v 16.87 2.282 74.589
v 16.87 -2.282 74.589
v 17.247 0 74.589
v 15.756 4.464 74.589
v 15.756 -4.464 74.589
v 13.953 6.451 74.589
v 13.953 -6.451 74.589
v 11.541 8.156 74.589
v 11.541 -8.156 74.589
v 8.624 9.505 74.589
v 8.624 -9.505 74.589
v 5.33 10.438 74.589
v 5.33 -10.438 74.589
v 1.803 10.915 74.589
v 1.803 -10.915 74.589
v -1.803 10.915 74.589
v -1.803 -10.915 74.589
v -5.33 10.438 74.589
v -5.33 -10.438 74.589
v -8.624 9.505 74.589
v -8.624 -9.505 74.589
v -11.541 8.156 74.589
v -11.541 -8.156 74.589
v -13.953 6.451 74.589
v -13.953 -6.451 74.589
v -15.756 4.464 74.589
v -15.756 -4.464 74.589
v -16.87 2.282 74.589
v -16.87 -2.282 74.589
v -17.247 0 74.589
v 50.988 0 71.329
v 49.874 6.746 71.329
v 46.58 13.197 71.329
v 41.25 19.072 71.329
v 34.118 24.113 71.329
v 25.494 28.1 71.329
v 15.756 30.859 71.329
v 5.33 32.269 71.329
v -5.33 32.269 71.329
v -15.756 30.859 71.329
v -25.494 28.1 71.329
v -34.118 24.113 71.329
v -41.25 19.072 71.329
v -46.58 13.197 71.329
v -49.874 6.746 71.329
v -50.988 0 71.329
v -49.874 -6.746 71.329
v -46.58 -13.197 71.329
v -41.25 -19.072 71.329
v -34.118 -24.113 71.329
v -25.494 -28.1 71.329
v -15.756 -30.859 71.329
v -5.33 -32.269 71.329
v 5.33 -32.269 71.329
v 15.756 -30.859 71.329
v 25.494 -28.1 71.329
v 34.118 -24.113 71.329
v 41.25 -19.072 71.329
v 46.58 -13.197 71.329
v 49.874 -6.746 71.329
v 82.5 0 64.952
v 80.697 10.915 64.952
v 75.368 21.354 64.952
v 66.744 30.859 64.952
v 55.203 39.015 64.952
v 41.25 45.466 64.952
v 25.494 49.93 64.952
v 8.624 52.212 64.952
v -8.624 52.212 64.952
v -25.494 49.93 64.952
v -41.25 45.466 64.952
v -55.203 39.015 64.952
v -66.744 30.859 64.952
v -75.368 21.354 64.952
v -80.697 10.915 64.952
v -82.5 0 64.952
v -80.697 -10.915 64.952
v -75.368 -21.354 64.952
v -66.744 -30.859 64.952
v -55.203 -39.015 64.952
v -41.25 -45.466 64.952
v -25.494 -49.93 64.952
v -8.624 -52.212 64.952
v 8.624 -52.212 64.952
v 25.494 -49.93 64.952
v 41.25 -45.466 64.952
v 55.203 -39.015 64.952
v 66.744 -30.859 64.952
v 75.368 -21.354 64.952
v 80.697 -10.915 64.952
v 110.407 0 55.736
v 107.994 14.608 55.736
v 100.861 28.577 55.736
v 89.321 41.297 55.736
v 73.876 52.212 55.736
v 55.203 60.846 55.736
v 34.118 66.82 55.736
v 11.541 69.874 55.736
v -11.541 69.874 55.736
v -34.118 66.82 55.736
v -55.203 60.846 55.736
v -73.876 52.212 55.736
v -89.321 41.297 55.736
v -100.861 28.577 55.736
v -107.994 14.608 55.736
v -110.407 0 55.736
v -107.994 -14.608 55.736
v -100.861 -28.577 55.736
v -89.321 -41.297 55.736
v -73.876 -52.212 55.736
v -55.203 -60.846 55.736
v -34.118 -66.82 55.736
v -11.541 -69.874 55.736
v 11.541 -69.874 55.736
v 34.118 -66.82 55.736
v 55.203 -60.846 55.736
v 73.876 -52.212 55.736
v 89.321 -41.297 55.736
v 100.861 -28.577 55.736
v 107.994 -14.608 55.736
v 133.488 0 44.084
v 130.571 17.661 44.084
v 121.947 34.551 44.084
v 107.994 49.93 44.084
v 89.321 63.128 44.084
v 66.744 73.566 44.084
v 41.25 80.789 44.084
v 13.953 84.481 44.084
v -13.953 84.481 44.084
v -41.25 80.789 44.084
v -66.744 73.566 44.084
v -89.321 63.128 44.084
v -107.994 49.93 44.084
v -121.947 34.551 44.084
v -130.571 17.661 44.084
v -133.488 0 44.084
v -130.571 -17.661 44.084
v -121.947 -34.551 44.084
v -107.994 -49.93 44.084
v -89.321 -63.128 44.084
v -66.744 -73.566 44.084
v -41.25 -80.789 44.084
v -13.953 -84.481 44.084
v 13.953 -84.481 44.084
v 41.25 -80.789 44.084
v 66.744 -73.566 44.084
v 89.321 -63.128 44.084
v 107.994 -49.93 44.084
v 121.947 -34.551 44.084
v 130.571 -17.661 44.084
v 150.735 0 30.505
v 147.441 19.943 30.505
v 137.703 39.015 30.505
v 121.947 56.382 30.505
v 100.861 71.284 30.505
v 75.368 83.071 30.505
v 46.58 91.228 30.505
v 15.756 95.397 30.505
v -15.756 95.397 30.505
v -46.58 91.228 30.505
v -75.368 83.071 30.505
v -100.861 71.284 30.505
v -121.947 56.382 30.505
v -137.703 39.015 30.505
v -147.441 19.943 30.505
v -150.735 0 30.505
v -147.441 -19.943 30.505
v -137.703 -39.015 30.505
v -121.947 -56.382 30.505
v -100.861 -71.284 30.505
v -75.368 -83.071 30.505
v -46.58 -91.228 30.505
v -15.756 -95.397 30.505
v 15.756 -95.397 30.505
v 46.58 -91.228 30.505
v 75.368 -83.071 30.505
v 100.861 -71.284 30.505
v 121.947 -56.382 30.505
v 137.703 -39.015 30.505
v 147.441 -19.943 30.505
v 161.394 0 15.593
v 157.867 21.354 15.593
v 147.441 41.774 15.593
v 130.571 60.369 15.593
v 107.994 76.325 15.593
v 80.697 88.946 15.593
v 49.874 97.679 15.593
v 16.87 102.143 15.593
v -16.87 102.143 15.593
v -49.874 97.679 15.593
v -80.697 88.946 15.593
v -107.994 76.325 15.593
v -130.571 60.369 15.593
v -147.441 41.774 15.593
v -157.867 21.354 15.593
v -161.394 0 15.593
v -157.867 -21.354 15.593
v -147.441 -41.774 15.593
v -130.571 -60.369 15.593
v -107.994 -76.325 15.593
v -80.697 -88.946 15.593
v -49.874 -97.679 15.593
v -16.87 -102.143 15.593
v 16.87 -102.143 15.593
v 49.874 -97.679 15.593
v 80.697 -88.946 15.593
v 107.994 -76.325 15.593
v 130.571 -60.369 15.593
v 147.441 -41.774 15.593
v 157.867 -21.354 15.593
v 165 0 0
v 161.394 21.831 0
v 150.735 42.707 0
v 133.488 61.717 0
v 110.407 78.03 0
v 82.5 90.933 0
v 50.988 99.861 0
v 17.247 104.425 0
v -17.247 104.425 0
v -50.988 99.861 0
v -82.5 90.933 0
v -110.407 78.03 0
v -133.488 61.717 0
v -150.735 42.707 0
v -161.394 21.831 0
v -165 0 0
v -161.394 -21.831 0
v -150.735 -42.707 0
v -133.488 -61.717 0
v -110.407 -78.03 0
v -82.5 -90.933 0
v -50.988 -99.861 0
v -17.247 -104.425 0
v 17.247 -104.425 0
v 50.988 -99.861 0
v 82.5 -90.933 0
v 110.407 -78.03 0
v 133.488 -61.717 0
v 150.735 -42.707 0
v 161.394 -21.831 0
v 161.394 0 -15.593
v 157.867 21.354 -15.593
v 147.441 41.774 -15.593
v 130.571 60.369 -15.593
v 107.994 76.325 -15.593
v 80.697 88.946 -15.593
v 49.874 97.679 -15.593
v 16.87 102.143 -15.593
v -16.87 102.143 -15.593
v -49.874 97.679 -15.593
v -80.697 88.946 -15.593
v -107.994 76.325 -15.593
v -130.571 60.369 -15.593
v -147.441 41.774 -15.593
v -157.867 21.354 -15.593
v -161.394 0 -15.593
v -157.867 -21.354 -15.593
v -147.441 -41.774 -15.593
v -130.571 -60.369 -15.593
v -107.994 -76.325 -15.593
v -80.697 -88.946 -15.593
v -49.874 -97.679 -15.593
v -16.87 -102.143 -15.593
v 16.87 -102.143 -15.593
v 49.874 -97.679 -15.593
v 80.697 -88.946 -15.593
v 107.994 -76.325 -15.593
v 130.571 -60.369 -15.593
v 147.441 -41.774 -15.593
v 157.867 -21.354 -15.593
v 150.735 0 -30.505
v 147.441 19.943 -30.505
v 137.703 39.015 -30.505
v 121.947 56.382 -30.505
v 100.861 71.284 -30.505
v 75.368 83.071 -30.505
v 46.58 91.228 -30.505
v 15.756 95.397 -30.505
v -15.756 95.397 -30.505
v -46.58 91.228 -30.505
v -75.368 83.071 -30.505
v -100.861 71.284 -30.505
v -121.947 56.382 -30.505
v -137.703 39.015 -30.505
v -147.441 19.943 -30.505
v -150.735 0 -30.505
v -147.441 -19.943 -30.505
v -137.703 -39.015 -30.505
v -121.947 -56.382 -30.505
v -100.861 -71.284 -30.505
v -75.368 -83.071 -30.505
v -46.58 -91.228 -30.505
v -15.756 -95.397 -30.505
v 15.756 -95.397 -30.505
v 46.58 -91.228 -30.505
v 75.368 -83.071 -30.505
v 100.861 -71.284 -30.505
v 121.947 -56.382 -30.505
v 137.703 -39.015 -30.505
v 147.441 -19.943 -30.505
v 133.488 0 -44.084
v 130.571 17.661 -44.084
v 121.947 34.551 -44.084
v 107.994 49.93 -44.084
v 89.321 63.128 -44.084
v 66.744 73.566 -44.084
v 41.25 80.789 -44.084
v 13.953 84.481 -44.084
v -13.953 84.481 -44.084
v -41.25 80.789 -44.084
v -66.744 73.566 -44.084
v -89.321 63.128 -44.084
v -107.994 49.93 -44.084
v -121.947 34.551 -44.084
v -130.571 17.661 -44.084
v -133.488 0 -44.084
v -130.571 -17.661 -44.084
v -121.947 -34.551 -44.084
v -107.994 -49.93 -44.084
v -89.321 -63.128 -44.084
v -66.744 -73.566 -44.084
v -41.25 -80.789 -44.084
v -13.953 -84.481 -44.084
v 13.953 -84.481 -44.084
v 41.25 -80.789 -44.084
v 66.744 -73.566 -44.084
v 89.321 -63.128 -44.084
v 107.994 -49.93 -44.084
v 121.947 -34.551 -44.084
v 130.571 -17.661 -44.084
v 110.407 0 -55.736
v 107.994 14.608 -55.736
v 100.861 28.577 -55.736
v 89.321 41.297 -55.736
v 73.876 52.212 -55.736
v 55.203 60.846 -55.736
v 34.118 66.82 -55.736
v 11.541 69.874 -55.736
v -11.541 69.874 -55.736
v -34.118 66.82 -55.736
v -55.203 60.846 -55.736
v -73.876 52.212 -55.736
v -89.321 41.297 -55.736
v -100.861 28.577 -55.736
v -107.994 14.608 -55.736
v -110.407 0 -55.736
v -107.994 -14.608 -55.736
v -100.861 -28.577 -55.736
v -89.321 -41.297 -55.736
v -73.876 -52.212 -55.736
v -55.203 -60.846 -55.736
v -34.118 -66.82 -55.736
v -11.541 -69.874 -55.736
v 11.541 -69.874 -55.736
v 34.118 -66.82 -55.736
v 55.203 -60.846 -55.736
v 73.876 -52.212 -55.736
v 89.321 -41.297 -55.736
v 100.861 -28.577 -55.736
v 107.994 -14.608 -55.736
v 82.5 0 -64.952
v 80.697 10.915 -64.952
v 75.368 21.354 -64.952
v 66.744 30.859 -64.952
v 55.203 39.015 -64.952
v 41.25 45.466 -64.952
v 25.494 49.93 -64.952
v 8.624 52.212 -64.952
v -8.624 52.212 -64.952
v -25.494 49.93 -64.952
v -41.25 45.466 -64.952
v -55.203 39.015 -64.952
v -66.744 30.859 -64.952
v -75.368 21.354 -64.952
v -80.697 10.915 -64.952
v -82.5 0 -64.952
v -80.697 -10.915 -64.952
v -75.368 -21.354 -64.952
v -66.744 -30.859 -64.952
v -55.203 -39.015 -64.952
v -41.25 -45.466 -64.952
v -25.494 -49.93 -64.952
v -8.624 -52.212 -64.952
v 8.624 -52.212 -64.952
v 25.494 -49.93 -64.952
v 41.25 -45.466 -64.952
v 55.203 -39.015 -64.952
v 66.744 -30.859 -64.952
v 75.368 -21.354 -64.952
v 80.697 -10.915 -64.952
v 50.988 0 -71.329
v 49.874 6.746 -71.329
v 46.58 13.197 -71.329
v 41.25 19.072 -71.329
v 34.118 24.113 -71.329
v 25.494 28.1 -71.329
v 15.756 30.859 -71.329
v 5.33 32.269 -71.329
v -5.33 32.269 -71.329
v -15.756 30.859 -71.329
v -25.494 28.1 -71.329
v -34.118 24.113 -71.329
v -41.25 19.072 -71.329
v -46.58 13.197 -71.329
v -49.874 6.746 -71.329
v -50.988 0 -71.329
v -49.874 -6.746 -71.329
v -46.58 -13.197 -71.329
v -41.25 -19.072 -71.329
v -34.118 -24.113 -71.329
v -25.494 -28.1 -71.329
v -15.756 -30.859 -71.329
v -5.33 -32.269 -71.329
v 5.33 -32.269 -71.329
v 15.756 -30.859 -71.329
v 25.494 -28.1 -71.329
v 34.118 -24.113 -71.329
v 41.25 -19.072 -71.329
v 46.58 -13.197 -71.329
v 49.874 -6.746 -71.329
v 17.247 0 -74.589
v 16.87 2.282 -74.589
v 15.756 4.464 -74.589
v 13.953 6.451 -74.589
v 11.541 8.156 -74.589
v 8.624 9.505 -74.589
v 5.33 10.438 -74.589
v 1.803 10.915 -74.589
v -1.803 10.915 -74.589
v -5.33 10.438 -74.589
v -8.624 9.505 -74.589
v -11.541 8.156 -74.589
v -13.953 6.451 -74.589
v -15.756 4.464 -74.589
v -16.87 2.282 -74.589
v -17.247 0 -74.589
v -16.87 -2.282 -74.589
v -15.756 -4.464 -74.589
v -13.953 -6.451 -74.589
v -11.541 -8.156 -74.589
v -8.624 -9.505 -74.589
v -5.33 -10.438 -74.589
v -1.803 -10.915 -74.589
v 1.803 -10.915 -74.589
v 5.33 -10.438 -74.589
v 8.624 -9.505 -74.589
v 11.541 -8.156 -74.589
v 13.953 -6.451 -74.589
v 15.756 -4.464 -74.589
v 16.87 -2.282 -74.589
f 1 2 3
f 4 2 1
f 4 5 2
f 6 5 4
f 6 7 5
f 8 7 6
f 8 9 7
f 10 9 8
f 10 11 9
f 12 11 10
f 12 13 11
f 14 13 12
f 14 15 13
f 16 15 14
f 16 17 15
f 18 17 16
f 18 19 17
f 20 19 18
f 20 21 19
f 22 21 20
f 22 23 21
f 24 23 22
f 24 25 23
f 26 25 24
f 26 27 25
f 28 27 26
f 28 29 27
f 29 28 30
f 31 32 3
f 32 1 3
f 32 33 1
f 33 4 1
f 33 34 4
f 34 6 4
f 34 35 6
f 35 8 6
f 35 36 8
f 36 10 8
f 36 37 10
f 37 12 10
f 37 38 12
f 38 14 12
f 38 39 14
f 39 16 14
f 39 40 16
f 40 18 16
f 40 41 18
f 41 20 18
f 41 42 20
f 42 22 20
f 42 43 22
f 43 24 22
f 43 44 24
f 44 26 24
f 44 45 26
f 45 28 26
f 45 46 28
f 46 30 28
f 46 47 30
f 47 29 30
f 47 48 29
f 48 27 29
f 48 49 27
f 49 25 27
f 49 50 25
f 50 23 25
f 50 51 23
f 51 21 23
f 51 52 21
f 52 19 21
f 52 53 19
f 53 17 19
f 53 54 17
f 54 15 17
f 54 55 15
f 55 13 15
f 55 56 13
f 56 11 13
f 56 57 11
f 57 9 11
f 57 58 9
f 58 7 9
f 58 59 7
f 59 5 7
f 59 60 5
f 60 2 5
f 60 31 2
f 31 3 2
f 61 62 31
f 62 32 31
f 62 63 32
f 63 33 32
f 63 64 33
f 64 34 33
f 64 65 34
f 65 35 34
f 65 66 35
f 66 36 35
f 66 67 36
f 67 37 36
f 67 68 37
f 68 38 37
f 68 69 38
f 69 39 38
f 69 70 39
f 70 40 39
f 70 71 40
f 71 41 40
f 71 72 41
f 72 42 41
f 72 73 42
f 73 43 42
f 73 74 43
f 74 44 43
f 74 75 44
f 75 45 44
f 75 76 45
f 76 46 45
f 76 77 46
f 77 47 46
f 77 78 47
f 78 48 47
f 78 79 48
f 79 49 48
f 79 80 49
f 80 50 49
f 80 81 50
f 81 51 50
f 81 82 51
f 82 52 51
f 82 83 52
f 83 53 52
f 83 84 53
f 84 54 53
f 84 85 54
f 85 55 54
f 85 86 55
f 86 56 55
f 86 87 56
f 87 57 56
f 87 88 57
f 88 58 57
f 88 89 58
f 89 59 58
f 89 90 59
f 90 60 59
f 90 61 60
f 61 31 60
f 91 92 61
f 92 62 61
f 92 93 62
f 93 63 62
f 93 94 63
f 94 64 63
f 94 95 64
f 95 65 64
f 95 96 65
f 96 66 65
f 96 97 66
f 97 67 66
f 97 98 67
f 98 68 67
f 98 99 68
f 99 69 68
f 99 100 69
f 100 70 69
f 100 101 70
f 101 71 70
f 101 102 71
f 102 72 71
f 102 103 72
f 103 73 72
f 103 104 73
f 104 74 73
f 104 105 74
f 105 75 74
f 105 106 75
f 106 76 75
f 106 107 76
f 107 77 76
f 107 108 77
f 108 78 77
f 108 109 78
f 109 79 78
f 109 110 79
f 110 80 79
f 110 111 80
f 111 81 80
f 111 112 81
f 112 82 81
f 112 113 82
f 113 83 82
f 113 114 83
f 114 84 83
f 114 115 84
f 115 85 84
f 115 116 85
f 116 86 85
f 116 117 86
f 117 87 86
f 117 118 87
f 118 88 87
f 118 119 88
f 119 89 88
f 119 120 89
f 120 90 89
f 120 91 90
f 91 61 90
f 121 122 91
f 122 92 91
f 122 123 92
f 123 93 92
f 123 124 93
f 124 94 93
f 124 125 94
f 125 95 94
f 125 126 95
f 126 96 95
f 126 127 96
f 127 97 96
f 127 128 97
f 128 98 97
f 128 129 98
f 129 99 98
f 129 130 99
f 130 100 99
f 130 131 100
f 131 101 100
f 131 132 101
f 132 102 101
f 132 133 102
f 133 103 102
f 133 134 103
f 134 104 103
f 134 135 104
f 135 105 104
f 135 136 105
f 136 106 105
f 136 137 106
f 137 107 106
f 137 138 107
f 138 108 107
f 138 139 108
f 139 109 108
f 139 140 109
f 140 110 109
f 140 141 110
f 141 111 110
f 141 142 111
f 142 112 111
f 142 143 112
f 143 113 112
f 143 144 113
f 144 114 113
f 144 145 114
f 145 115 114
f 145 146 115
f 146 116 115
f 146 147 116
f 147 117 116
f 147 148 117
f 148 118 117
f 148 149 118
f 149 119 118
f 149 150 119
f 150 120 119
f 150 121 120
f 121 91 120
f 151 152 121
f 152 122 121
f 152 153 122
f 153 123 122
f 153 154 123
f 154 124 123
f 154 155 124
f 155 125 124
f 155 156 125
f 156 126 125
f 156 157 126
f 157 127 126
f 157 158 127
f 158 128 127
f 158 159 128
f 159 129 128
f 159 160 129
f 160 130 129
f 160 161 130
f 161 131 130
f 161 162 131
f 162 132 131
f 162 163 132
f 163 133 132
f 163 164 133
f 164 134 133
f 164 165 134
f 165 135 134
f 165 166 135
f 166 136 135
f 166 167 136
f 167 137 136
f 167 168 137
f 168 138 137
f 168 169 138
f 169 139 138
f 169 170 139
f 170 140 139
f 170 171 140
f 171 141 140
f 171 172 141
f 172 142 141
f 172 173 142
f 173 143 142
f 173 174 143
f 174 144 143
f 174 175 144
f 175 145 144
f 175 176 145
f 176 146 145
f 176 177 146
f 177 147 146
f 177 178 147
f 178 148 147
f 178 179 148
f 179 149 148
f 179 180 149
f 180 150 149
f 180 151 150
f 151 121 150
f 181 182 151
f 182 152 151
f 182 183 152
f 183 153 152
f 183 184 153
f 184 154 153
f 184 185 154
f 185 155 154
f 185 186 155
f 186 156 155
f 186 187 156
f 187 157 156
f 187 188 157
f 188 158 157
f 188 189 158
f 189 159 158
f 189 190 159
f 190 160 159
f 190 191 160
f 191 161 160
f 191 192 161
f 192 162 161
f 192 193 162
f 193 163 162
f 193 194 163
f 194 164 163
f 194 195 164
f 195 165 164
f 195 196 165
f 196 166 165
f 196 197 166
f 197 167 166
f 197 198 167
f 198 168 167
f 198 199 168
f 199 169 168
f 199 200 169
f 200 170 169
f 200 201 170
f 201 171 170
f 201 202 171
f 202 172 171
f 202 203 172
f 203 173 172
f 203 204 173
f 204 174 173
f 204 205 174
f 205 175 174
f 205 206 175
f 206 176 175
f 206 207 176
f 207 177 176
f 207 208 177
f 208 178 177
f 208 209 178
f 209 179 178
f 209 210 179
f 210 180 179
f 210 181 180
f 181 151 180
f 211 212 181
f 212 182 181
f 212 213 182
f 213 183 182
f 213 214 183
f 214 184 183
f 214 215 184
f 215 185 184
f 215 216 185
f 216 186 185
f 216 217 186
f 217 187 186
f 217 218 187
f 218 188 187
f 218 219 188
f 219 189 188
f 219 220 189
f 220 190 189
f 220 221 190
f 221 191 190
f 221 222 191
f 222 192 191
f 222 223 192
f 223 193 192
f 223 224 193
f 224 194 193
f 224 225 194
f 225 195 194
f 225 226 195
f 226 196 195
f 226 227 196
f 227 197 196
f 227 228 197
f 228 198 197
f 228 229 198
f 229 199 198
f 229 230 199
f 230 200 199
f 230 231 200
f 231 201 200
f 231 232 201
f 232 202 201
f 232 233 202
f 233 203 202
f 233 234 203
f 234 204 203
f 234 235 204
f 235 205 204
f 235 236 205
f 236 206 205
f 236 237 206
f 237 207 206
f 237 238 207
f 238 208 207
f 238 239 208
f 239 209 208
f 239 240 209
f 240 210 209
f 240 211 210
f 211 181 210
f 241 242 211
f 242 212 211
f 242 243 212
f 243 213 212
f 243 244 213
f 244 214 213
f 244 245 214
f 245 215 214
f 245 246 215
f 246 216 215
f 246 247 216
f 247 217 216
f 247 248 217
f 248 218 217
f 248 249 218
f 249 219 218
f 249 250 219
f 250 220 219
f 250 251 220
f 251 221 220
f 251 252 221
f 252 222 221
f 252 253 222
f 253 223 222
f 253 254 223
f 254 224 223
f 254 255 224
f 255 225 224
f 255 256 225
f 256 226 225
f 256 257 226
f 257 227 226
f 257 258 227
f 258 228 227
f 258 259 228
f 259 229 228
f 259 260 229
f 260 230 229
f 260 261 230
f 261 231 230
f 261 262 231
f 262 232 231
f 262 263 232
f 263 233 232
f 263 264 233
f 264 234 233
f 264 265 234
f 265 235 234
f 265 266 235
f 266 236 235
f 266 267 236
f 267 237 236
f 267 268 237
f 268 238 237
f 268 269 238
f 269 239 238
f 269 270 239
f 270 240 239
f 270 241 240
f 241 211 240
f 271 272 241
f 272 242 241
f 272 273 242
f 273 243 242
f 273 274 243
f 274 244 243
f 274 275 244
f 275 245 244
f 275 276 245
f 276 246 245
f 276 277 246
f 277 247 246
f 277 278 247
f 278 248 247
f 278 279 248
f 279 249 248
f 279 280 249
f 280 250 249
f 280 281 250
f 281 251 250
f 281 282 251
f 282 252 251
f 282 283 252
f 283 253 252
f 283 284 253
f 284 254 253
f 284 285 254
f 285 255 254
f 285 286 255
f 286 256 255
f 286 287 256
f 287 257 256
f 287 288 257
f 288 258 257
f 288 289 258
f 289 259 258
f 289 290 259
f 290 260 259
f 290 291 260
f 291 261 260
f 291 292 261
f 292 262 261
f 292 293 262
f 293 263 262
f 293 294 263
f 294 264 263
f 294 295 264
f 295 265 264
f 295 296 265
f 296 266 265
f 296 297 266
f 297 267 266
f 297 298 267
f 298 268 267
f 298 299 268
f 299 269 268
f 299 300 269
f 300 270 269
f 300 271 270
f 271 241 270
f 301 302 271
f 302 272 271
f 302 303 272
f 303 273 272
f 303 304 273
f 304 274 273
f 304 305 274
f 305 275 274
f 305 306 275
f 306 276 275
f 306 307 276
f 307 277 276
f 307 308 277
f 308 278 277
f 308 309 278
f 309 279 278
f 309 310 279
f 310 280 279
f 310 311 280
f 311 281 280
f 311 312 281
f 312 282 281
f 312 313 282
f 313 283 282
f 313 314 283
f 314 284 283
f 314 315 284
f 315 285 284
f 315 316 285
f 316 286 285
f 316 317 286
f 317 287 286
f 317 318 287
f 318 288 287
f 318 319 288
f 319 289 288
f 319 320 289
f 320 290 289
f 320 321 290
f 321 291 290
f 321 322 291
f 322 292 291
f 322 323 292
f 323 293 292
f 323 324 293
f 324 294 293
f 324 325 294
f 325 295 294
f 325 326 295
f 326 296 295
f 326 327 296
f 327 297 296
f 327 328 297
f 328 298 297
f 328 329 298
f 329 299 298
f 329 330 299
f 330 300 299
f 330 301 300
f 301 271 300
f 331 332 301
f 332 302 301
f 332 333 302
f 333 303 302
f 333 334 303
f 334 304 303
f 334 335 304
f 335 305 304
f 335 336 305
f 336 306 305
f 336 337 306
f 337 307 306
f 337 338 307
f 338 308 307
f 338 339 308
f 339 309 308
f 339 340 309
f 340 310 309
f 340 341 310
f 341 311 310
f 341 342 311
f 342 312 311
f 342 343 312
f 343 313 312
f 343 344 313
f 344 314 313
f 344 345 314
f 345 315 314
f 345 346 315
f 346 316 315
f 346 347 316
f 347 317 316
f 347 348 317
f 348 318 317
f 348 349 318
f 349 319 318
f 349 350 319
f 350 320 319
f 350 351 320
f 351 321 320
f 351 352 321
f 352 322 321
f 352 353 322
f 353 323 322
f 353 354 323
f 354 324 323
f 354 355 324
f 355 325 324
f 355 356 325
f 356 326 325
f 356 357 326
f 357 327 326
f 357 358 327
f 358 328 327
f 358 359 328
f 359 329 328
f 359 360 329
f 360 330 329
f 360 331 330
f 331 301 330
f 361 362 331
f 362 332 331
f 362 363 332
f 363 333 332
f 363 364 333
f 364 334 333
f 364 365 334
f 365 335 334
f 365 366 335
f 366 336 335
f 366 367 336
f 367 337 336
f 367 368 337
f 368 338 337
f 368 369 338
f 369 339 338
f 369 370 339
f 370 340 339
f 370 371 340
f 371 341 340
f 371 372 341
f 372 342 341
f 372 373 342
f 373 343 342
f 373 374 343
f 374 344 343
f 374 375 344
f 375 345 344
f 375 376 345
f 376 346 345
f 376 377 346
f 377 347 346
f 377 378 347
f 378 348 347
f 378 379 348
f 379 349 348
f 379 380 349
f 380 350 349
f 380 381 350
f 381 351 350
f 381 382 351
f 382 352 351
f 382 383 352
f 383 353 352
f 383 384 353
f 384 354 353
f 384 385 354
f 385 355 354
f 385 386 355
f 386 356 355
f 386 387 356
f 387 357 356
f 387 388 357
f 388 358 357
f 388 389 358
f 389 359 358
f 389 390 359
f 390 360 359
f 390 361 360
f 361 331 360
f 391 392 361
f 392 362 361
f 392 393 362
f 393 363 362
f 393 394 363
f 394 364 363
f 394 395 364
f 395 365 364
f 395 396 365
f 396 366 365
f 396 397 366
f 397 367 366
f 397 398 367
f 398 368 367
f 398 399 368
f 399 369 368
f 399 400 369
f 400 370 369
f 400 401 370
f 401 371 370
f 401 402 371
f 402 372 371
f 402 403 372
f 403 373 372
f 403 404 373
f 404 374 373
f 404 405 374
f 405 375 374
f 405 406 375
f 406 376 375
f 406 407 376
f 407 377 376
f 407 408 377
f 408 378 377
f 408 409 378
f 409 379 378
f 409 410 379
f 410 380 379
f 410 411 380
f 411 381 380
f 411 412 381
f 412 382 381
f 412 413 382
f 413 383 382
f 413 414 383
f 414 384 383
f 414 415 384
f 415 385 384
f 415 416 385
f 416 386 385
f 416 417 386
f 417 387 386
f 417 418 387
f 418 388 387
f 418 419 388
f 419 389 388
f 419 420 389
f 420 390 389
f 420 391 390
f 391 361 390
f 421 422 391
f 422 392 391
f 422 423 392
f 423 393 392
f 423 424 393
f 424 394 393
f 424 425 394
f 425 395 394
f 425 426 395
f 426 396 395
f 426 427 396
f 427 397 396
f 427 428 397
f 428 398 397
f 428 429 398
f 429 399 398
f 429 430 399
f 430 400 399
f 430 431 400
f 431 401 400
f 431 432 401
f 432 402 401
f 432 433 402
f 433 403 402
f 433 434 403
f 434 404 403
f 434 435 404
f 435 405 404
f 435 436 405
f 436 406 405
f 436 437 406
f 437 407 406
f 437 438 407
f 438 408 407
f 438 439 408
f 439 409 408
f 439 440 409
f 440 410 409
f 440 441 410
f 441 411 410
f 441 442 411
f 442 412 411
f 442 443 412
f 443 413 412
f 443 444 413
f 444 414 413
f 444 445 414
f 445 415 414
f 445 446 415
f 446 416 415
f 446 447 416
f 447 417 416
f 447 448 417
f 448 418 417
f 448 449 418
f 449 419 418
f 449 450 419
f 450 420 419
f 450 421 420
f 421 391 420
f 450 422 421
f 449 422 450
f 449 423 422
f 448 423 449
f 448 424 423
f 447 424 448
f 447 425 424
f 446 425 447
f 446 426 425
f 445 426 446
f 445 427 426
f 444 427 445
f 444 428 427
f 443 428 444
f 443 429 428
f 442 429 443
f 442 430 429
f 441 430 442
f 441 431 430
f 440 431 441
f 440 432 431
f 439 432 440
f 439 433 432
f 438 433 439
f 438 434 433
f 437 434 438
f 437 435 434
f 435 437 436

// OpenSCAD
// Generated by SolidPython 1.0.1 on 2020-07-29 00:46:49


scale(v = [11, 7, 5]) {
	sphere(r = 15);
}
/***********************************************
*********      SolidPython code:      **********
************************************************
 
# import packages: SolidPython
from solid import *
from solid.utils import *
from itertools import chain, combinations, permutations


class Resize:

    def __init__(self, scad_file):
        self.scad_file = scad_file
        #self.scad_file = import_scad(scad_file)
        # cone/cylinder param:
        self.r1 = 0
        self.r2 = 0
        self.h = 0
        # rectangular prism param:
        self.w = 0
        self.l = 0
        # ellipse param:
        self.r = 0

    # import OpenScad code (file name corresponds to shape)


    # classify shape + parameters
    def assign(self, param1, param2, param3):
        if self.scad_file == 'cone.scad':
            self.r1 = param1
            self.r2 = param2
            self.h = param3
        elif self.scad_file == 'cylinder.scad':
            self.r1 = param1
            self.r2 = param2
            self.h = param3
        elif self.scad_file == 'rectangularPrism.scad':
            self.h = param1
            self.l = param2
            self.w = param3
        else:
            self.r = param1
            self.h = param2

    # resize parameters
    def iterate(self):
        x = range(3, 20, 2)
        i = 1
        if self.scad_file == 'cone.scad':
            tempList = list(permutations(x, 2))
            for temp in tempList:
                param1 = temp[0]
                param2 = temp[1]
                filepath = 'produced_scad_files/' + 'cone' + str(param1) + '_' + str(param2) + '_' + '.scad'
                scad_render_to_file(cylinder(h=param1, r1=param2, r2=0), filepath)

        elif self.scad_file == 'cylinder.scad':
            tempList = list(permutations(x, 3))
            for temp in tempList:
                param1 = temp[0]
                param2 = temp[1]
                filepath = 'produced_scad_files/' + 'cylinder' + str(param1) + '_' + str(param2) + '_' + '.scad'
                scad_render_to_file(cylinder(h=param1, r1=param2, r2=param2), filepath)

        elif self.scad_file == 'rectangularPrism.scad':
            tempList = list(permutations(x, 3))
            for temp in tempList:
                param1 = temp[0]
                param2 = temp[1]
                param3 = temp[2]
                filepath = 'produced_scad_files/' + 'rectangularPrism' + str(param1) + '_' + str(param2) + '_' + str(
                    param3) + '.scad'
                scad_render_to_file(cube(size=(param1, param2, param3)), filepath)

        elif self.scad_file == 'ellipse.scad':
            tempList = list(permutations(x, 4))
            for temp in tempList:
                param1 = temp[0]
                param2 = temp[1]
                param3 = temp[2]
                param4 = temp[3]
                filepath = 'produced_scad_files/' + 'ellipse' + str(param1) + '_' + str(param2) + '_' + str(param3) + '_' + str(param4) + '.scad'
                scad_render_to_file(scale([param1, param2, param3])(sphere(r=param4)), filepath)

    def render_to_scadfile(self):
        scad_render_to_file(scad, 'example.scad') 
 
************************************************/
